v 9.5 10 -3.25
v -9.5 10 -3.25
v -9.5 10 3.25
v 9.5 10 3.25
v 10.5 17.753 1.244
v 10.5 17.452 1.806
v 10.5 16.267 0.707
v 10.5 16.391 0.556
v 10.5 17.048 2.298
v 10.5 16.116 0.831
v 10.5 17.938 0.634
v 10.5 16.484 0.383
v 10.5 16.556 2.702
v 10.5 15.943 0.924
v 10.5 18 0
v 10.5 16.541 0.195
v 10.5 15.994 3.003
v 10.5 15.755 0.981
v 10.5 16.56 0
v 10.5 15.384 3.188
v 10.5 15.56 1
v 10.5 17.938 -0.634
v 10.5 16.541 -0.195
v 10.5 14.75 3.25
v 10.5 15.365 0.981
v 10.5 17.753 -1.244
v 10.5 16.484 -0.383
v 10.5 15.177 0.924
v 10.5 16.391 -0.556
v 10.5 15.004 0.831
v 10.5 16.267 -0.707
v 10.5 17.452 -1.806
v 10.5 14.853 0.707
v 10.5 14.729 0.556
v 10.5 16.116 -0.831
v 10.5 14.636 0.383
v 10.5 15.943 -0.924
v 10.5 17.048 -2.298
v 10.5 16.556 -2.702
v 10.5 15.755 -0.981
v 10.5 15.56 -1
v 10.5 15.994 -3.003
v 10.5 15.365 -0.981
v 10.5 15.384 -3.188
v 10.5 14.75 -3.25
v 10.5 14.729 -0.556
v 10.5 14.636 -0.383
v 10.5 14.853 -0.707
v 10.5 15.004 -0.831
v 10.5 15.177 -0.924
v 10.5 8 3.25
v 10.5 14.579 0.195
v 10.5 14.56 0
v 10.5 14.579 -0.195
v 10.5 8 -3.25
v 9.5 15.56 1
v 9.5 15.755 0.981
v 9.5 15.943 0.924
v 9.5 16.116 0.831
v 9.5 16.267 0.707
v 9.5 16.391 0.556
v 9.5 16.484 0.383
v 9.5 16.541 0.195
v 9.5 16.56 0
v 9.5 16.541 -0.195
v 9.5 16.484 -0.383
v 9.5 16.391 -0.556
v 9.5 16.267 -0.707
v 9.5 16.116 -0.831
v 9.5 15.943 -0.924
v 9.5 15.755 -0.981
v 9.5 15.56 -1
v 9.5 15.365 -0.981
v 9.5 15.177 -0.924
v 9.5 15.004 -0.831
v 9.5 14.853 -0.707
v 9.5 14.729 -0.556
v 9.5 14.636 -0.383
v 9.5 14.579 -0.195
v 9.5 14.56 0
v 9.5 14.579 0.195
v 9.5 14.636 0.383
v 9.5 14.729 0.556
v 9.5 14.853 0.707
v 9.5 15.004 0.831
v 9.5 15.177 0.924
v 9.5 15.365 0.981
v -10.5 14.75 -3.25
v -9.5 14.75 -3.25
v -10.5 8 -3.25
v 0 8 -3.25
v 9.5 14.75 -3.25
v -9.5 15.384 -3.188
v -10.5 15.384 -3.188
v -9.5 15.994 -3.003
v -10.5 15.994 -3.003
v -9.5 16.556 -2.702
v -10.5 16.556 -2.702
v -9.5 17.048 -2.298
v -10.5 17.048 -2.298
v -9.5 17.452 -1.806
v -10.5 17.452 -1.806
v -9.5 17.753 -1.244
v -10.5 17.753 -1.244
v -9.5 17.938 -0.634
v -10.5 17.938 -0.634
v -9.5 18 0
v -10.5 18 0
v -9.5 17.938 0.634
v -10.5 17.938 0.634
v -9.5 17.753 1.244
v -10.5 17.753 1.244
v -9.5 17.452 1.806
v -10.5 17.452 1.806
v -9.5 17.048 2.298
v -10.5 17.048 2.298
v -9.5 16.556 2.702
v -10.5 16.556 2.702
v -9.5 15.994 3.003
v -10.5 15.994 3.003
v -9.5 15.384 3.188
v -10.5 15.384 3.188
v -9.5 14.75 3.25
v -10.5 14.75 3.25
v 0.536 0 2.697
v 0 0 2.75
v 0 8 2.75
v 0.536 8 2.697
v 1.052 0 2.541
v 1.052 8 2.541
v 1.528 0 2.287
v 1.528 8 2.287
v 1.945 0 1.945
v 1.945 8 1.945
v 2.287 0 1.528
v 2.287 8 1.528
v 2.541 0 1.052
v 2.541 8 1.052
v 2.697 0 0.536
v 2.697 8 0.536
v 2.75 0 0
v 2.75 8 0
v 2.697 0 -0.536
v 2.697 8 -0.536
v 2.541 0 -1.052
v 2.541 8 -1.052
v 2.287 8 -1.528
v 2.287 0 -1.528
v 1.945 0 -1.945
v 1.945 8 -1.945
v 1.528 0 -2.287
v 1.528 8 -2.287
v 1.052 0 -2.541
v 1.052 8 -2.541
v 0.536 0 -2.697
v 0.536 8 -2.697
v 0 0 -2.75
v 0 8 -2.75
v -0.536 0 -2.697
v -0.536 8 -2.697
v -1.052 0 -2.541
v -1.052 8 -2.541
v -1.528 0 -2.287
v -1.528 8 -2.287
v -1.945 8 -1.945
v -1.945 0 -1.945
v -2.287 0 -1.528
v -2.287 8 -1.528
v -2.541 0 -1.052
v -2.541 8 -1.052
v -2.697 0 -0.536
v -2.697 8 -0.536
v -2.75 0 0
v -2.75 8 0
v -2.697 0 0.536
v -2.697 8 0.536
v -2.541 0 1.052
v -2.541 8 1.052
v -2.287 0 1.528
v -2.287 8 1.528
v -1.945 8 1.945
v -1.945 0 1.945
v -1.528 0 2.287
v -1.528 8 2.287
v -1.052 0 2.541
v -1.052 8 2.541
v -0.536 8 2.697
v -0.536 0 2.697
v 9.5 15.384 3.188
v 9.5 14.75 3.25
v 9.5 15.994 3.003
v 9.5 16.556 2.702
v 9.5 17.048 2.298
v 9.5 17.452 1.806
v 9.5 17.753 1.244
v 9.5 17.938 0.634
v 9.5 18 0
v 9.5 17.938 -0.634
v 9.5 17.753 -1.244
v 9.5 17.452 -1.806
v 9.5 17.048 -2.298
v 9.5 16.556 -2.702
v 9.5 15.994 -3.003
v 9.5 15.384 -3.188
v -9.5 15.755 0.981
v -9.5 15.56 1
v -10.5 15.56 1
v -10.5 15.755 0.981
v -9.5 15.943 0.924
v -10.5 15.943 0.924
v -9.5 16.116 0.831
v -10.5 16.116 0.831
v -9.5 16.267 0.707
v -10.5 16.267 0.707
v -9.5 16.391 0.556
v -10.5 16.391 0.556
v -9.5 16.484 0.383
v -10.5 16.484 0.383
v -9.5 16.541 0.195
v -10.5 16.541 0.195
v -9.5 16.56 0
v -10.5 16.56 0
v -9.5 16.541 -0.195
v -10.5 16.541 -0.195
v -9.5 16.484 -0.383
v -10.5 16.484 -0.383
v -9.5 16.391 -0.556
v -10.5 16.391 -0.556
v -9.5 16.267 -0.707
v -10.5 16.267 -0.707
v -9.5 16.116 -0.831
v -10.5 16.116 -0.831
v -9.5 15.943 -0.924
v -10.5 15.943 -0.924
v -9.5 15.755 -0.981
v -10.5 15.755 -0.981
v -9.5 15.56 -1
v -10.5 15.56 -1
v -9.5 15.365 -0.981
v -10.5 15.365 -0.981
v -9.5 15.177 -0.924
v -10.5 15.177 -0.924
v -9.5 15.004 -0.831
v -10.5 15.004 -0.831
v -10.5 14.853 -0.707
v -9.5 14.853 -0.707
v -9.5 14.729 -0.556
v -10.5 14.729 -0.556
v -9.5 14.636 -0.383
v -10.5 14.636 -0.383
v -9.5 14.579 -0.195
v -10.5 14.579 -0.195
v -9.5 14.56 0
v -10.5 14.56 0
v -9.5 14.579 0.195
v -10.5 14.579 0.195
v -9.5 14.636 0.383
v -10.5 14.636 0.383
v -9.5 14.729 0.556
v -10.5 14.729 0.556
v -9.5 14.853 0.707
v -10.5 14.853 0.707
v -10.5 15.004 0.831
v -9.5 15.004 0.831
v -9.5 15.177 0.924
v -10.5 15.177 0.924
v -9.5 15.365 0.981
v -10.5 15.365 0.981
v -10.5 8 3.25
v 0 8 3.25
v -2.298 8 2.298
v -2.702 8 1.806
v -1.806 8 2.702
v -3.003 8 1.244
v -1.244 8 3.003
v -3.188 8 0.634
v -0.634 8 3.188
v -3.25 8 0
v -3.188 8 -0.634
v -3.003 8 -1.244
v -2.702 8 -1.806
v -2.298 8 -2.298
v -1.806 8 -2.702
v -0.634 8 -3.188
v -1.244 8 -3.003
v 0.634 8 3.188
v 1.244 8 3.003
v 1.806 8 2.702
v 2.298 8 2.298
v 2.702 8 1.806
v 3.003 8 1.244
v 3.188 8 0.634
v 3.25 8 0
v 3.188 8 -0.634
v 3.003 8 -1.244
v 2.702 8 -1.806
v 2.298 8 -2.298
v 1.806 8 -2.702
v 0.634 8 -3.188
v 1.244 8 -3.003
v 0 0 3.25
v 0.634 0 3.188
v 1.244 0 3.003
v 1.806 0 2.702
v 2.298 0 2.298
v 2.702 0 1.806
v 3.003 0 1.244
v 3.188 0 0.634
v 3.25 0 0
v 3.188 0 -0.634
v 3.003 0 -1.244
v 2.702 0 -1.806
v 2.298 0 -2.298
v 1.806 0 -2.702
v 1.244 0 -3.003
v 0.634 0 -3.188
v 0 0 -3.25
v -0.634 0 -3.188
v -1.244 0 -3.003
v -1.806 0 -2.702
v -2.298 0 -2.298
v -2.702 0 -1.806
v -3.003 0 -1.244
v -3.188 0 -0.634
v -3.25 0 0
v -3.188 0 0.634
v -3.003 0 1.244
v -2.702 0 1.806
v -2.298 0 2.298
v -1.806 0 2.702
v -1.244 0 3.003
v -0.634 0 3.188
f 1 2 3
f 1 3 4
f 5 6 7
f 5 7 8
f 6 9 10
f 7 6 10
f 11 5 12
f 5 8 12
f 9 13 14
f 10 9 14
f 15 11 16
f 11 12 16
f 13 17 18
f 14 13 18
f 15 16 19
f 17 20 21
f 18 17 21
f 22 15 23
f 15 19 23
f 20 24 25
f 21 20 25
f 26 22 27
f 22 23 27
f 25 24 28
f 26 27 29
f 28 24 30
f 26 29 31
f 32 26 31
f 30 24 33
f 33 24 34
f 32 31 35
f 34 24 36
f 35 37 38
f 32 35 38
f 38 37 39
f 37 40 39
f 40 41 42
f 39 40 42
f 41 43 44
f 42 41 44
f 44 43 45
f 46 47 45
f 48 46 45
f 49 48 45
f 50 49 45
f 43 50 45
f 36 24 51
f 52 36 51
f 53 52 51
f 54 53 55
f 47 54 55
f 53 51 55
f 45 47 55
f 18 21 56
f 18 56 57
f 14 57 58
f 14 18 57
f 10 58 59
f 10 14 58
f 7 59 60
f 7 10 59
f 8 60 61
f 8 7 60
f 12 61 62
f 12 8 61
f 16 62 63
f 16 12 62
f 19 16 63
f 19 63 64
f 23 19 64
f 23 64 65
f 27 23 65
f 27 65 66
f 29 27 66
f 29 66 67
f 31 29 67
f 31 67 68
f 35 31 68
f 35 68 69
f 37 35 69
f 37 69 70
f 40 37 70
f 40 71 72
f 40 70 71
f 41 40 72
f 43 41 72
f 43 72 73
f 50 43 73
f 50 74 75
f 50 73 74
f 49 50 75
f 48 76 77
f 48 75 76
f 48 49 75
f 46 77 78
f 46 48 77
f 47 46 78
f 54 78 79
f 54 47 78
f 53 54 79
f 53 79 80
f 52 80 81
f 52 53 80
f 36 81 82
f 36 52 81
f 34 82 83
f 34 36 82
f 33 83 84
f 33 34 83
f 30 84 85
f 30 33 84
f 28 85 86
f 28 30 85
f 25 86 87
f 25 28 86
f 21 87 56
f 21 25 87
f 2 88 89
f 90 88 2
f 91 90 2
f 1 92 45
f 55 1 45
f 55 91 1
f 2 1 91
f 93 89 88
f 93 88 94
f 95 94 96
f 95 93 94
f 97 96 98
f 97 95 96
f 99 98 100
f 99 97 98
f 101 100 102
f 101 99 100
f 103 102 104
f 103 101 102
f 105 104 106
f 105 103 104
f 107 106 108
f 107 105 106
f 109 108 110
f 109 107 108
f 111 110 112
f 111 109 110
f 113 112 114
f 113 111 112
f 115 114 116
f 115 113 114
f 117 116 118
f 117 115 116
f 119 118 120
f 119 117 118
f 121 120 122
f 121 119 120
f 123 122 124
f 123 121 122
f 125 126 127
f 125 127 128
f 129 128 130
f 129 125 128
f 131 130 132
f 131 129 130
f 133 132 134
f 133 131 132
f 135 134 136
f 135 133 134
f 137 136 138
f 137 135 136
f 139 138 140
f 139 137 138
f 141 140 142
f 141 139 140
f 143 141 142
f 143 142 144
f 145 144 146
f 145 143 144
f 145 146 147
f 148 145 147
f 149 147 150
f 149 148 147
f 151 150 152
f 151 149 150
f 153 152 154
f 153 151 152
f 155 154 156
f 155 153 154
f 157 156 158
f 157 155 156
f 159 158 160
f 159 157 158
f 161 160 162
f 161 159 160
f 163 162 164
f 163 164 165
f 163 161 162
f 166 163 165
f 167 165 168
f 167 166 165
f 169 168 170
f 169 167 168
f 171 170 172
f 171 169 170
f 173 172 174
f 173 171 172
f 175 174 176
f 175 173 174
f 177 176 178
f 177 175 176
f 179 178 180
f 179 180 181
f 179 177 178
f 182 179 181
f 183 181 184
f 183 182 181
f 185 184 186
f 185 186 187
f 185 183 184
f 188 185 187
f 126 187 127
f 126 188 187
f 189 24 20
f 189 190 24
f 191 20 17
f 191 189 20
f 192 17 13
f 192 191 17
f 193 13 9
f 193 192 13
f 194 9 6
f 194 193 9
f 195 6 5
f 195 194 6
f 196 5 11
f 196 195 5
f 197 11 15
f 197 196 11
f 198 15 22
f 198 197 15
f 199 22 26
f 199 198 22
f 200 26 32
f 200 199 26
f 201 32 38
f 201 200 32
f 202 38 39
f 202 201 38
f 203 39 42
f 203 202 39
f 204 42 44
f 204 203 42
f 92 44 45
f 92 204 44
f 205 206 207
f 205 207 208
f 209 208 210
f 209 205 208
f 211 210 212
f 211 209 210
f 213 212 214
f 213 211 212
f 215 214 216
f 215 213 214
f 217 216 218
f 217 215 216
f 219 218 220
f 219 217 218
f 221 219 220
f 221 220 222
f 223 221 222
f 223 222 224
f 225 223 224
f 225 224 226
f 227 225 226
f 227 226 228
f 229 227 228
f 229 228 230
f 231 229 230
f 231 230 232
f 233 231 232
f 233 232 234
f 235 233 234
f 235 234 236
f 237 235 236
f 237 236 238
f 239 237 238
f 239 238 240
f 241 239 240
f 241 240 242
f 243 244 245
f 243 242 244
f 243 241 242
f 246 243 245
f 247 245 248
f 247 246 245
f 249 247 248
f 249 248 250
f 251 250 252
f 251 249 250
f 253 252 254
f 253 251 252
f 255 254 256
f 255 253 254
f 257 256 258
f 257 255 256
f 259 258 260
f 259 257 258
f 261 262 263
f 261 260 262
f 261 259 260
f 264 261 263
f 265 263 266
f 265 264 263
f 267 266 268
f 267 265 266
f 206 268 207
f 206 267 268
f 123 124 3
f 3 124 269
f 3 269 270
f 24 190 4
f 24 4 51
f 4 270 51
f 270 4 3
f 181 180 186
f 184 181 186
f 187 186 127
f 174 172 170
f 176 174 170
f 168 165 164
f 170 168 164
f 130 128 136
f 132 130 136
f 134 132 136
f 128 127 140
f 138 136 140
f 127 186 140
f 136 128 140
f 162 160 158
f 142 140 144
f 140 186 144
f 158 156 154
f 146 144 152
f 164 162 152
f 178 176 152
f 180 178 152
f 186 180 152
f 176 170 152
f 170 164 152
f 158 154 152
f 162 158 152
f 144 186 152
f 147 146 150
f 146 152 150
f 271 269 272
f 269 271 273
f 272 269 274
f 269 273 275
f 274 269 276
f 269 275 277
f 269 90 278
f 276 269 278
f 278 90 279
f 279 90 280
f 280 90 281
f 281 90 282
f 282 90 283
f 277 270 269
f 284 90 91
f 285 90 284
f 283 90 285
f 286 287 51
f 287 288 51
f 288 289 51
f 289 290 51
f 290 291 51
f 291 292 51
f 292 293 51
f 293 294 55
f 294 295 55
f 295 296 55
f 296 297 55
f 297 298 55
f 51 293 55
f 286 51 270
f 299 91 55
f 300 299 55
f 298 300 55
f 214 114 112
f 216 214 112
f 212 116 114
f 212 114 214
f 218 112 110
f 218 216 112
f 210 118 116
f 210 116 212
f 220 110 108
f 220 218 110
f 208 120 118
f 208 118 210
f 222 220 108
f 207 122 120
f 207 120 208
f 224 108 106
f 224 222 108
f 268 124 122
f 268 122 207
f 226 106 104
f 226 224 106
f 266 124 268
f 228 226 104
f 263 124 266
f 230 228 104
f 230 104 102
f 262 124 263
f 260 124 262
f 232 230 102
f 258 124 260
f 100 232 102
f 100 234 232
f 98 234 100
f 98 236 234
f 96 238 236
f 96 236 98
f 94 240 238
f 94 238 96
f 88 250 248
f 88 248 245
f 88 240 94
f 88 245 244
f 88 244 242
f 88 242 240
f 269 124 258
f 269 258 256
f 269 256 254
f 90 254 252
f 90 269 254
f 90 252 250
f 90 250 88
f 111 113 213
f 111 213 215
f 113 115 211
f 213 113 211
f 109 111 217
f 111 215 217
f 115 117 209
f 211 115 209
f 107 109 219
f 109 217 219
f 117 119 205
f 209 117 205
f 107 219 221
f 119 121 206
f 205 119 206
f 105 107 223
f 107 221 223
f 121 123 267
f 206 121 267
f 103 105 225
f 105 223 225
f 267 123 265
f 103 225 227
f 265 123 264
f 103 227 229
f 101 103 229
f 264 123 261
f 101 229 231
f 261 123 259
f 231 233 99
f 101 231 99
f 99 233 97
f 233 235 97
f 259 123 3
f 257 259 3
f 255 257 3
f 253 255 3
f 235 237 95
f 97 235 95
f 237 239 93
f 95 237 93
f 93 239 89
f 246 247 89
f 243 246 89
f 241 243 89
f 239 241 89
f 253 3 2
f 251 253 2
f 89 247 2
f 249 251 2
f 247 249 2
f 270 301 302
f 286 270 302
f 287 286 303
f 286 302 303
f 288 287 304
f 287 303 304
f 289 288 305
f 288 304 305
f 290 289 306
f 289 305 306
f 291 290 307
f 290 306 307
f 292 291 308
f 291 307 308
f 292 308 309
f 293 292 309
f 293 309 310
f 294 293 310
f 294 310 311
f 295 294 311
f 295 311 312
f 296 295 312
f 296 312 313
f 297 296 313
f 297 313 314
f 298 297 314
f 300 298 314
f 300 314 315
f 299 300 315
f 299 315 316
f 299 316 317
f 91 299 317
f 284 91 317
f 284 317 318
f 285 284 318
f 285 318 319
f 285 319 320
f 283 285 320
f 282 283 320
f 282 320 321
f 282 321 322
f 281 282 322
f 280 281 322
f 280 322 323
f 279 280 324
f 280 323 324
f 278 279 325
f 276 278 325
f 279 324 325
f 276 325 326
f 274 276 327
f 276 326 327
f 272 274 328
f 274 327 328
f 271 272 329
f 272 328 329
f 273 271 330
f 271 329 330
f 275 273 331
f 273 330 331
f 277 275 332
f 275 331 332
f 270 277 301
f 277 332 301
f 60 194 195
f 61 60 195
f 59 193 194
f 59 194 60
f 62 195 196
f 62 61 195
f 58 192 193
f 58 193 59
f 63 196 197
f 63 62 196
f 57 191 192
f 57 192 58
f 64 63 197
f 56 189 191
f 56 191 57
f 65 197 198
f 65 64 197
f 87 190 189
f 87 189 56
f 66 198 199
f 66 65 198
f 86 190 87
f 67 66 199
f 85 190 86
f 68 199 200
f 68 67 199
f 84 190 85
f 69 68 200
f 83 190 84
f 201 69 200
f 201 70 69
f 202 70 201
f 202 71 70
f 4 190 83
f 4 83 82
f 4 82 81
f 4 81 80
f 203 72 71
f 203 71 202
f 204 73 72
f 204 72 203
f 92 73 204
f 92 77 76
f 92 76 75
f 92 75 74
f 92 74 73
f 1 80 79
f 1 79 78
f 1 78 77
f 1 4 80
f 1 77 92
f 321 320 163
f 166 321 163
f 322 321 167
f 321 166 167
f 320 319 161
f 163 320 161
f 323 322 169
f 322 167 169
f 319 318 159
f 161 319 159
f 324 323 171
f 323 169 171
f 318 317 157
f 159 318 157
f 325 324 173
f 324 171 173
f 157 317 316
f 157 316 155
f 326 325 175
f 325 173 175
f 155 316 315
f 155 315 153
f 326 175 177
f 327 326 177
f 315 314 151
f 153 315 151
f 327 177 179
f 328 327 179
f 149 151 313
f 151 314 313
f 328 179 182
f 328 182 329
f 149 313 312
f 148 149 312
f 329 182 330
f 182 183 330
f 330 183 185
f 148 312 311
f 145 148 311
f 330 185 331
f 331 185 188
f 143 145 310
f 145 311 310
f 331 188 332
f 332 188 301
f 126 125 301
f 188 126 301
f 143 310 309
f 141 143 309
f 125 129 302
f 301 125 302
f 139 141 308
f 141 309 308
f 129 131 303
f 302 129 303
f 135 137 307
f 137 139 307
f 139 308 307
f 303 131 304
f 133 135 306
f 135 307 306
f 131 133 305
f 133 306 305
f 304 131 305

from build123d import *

# Parameters (mm, degrees)
SKETCH1_R               = 3.25
SKETCH1_R_2             = 2.75
BOSS_EXTRUDE1_DEPTH     = 8
SKETCH2_W               = 21
SKETCH2_H               = 6.5
BOSS_EXTRUDE2_DEPTH     = 2
SKETCH3_W               = 1
SKETCH3_H               = 6.5
BOSS_EXTRUDE3_DEPTH     = 8
CUT_EXTRUDE1_DEPTH      = 28.84892278
CUT_EXTRUDE1_DEPTH_BACK = 28.84892278
SKETCH4_R               = 1
FILLET1_RADIUS          = 3.25
FILLET1_LENGTH          = 1
FILLET2_RADIUS          = 3.25
FILLET2_LENGTH          = 1


with BuildPart() as part:
    # Sketch1 → Boss-Extrude1 (new body)
    with BuildSketch(Plane(origin=(0, 0, 0), x_dir=(1, 0, 0), z_dir=(0, 1, 0))):
        with Locations(Location((0, 0, 0), (0, 0, 270))):
            Circle(SKETCH1_R)
        with Locations(Location((0, 0, 0), (0, 0, 270))):
            Circle(SKETCH1_R_2, mode=Mode.SUBTRACT)
    extrude(amount=BOSS_EXTRUDE1_DEPTH)

    # Sketch2 → Boss-Extrude2 (add)
    with BuildSketch(Plane(origin=(0, 8, 0), x_dir=(1, 0, 0), z_dir=(0, 1, 0))):
        Rectangle(SKETCH2_W, SKETCH2_H)
    extrude(amount=BOSS_EXTRUDE2_DEPTH)

    # Sketch3 → Boss-Extrude3 (add)
    with BuildSketch(Plane(origin=(0, 10, 0), x_dir=(1, 0, 0), z_dir=(0, 1, 0))):
        with Locations((-10, 0)):
            Rectangle(SKETCH3_W, SKETCH3_H)
        with Locations((10, 0)):
            Rectangle(SKETCH3_W, SKETCH3_H)
    extrude(amount=BOSS_EXTRUDE3_DEPTH)

    # Sketch4 → Cut-Extrude1 (cut, two sides: drawn at the far end of the back side and taken through both)
    with BuildSketch(Plane.ZY.offset(10.5).offset(-CUT_EXTRUDE1_DEPTH_BACK)):
        with Locations((0, 15.56)):
            Circle(SKETCH4_R)
    extrude(amount=CUT_EXTRUDE1_DEPTH + CUT_EXTRUDE1_DEPTH_BACK, mode=Mode.SUBTRACT)

    # Fillet1: full round fillet: the end face becomes a half cylinder, R = half its width
    fillet1_face = Plane((10, 18, 0), x_dir=(-1, 0, 0), z_dir=(0, 1, 0))  # on the end face: x along it, z out of the body
    fillet1_slab = fillet1_face.offset(-FILLET1_RADIUS / 2) * Box(FILLET1_LENGTH, 2 * FILLET1_RADIUS, FILLET1_RADIUS, mode=Mode.PRIVATE)  # the body's end, R deep
    fillet1_round = Plane((10, 14.75, 0), x_dir=(0, 1, 0), z_dir=(-1, 0, 0)) * Cylinder(FILLET1_RADIUS, FILLET1_LENGTH, mode=Mode.PRIVATE)  # its axis R under the face
    add(fillet1_slab - fillet1_round, mode=Mode.SUBTRACT)

    # Fillet2: full round fillet: the end face becomes a half cylinder, R = half its width
    fillet2_face = Plane((-10, 18, 0), x_dir=(1, 0, 0), z_dir=(0, 1, 0))  # on the end face: x along it, z out of the body
    fillet2_slab = fillet2_face.offset(-FILLET2_RADIUS / 2) * Box(FILLET2_LENGTH, 2 * FILLET2_RADIUS, FILLET2_RADIUS, mode=Mode.PRIVATE)  # the body's end, R deep
    fillet2_round = Plane((-10, 14.75, 0), x_dir=(0, 1, 0), z_dir=(1, 0, 0)) * Cylinder(FILLET2_RADIUS, FILLET2_LENGTH, mode=Mode.PRIVATE)  # its axis R under the face
    add(fillet2_slab - fillet2_round, mode=Mode.SUBTRACT)


solid = part.part
